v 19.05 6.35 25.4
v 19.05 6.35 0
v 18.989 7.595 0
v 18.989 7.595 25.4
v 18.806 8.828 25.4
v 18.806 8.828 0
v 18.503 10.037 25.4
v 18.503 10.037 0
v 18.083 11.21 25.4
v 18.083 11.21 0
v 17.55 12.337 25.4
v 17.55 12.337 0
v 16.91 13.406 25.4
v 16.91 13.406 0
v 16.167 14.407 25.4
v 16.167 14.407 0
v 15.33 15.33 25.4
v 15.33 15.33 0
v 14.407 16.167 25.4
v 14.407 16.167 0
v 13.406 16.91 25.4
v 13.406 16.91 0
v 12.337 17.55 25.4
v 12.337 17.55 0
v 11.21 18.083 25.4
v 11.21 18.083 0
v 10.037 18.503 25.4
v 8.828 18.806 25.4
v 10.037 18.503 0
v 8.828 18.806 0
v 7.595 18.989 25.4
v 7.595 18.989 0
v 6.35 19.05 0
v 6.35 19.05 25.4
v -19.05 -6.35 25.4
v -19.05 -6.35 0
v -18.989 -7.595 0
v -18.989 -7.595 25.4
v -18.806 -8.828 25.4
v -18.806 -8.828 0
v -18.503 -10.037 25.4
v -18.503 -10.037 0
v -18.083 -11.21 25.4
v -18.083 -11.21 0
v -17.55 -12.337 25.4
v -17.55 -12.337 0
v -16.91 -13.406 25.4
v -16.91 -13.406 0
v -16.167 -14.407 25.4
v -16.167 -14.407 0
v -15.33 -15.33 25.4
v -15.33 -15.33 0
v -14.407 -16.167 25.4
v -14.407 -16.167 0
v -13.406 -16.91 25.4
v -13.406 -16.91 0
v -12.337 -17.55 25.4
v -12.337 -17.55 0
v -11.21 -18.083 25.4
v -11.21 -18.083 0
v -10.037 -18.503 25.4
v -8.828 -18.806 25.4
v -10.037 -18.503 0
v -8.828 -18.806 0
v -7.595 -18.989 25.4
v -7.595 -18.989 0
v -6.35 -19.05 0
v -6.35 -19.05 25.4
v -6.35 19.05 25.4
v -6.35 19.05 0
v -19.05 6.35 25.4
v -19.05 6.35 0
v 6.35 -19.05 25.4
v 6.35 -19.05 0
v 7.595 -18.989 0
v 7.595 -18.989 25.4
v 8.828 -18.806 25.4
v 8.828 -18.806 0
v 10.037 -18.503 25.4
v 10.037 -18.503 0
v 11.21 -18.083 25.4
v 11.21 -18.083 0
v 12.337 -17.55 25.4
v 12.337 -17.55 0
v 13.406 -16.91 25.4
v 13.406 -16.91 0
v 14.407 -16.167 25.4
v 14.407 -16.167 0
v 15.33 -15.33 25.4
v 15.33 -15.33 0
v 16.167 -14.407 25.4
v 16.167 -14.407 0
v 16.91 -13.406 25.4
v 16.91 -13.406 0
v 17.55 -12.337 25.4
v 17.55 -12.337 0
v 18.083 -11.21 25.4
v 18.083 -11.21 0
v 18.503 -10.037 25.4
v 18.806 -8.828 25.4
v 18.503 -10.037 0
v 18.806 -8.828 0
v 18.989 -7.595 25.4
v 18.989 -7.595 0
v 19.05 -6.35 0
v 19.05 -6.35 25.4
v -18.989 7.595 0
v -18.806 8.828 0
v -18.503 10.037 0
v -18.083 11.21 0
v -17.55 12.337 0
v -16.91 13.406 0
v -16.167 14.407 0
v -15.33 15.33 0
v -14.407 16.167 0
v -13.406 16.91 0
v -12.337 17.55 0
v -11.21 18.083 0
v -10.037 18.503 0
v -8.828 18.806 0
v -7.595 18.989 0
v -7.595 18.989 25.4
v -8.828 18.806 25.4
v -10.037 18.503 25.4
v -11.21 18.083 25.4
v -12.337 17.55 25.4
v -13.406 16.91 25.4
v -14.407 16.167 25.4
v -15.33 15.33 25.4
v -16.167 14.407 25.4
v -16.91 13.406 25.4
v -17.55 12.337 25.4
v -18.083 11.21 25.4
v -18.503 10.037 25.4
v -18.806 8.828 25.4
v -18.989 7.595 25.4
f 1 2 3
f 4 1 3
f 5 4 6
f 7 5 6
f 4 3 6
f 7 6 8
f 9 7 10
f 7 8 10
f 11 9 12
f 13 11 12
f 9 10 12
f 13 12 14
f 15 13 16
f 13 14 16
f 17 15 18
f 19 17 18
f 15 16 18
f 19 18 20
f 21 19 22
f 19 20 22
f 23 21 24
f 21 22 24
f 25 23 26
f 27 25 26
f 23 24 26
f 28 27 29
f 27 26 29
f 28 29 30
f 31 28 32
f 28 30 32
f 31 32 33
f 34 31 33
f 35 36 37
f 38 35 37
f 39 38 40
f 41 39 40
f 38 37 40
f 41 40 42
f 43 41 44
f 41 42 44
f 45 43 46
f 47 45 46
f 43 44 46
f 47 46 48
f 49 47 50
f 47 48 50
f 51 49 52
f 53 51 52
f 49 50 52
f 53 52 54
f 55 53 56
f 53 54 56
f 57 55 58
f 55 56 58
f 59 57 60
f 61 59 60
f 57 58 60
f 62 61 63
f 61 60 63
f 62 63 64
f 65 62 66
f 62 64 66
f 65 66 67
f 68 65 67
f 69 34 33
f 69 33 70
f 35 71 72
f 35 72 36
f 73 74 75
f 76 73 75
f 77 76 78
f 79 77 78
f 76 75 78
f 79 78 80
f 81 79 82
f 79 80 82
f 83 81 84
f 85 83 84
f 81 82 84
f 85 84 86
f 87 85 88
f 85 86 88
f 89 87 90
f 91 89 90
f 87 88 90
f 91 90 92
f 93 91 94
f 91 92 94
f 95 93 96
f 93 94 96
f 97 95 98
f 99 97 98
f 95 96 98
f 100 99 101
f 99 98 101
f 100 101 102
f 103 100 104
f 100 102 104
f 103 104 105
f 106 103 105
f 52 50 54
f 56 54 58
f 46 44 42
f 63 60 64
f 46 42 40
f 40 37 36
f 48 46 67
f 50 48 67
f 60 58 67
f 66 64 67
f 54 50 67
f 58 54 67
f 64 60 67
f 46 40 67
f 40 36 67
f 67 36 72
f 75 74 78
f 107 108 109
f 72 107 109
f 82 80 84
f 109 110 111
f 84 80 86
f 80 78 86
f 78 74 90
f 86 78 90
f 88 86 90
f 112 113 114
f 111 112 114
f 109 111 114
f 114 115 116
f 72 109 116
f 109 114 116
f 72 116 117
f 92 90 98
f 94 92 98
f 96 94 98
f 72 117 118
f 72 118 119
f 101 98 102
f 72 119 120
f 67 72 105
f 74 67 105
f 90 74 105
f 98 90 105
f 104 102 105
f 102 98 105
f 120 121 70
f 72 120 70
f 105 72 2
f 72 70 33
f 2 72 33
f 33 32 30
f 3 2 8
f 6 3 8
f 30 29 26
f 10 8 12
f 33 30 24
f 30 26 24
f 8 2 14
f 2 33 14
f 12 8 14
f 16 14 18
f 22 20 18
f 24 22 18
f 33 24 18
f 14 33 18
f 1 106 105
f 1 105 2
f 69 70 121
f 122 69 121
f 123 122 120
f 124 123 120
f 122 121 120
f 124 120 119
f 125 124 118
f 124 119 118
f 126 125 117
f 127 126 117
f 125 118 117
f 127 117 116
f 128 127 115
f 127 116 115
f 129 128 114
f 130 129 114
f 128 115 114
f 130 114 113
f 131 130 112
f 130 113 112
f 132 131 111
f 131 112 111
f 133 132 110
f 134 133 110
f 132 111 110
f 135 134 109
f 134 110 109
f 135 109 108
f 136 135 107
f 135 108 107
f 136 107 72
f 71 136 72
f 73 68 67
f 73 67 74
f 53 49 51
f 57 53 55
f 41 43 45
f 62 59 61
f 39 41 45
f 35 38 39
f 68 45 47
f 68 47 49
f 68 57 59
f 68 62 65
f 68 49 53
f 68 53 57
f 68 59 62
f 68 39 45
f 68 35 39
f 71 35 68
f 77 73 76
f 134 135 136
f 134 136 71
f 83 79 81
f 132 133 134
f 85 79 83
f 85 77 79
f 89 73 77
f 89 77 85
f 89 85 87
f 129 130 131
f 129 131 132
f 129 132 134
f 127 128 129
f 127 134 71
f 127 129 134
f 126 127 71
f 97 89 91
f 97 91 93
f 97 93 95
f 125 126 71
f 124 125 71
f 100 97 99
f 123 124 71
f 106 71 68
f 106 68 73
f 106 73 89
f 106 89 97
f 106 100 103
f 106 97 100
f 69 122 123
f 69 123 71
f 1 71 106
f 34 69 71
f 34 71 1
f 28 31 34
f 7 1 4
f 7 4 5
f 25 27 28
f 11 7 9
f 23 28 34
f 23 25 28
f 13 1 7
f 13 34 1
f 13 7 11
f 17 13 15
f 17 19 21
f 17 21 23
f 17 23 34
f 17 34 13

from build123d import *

# Parameters (mm, degrees)
F1_DEPTH = 76.2
F2_DEPTH = 25.4
F5_DEPTH = 50.8
F6_DEPTH = 25.4


with BuildPart() as f1:
    # F0 (on Top) → F1 (new body)
    with BuildSketch(Plane.XY):
        with BuildLine():
            ThreePointArc((31.75, 6.35), (28.0302561211, 15.3302561211), (19.05, 19.05))
            Line((19.05, 19.05), (-19.05, 19.05))
            ThreePointArc((-19.05, 19.05), (-28.0302561211, 15.3302561211), (-31.75, 6.35))
            Line((-31.75, 6.35), (-31.75, -6.35))
            ThreePointArc((-31.75, -6.35), (-28.0302561211, -15.3302561211), (-19.05, -19.05))
            Line((-19.05, -19.05), (19.05, -19.05))
            ThreePointArc((19.05, -19.05), (28.0302561211, -15.3302561211), (31.75, -6.35))
            Line((31.75, -6.35), (31.75, 6.35))
        make_face()
    extrude(amount=F1_DEPTH)

    # F2 (cut): a face of the model
    f2_faces = [f1.faces().sort_by_distance(p)[0] for p in [
        (0, 0, 76.2),
    ]]
    extrude(f2_faces, amount=-F2_DEPTH, mode=Mode.SUBTRACT)


with BuildPart() as f5:
    # F4 (on Top) → F5 (new body)
    with BuildSketch(Plane.XY):
        with BuildLine():
            Line((6.35, 19.05), (-6.35, 19.05))
            ThreePointArc((-6.35, 19.05), (-15.3302561211, 15.3302561211), (-19.05, 6.35))
            Line((-19.05, 6.35), (-19.05, -6.35))
            ThreePointArc((-19.05, -6.35), (-15.3302561211, -15.3302561211), (-6.35, -19.05))
            Line((-6.35, -19.05), (6.35, -19.05))
            ThreePointArc((6.35, -19.05), (15.3302561211, -15.3302561211), (19.05, -6.35))
            Line((19.05, -6.35), (19.05, 6.35))
            ThreePointArc((19.05, 6.35), (15.3302561211, 15.3302561211), (6.35, 19.05))
        make_face()
    extrude(amount=F5_DEPTH)

    # F6 (cut): a face of the model
    f6_faces = [f5.faces().sort_by_distance(p)[0] for p in [
        (0, 0, 50.8),
    ]]
    extrude(f6_faces, amount=-F6_DEPTH, mode=Mode.SUBTRACT)


solid = f5.part
